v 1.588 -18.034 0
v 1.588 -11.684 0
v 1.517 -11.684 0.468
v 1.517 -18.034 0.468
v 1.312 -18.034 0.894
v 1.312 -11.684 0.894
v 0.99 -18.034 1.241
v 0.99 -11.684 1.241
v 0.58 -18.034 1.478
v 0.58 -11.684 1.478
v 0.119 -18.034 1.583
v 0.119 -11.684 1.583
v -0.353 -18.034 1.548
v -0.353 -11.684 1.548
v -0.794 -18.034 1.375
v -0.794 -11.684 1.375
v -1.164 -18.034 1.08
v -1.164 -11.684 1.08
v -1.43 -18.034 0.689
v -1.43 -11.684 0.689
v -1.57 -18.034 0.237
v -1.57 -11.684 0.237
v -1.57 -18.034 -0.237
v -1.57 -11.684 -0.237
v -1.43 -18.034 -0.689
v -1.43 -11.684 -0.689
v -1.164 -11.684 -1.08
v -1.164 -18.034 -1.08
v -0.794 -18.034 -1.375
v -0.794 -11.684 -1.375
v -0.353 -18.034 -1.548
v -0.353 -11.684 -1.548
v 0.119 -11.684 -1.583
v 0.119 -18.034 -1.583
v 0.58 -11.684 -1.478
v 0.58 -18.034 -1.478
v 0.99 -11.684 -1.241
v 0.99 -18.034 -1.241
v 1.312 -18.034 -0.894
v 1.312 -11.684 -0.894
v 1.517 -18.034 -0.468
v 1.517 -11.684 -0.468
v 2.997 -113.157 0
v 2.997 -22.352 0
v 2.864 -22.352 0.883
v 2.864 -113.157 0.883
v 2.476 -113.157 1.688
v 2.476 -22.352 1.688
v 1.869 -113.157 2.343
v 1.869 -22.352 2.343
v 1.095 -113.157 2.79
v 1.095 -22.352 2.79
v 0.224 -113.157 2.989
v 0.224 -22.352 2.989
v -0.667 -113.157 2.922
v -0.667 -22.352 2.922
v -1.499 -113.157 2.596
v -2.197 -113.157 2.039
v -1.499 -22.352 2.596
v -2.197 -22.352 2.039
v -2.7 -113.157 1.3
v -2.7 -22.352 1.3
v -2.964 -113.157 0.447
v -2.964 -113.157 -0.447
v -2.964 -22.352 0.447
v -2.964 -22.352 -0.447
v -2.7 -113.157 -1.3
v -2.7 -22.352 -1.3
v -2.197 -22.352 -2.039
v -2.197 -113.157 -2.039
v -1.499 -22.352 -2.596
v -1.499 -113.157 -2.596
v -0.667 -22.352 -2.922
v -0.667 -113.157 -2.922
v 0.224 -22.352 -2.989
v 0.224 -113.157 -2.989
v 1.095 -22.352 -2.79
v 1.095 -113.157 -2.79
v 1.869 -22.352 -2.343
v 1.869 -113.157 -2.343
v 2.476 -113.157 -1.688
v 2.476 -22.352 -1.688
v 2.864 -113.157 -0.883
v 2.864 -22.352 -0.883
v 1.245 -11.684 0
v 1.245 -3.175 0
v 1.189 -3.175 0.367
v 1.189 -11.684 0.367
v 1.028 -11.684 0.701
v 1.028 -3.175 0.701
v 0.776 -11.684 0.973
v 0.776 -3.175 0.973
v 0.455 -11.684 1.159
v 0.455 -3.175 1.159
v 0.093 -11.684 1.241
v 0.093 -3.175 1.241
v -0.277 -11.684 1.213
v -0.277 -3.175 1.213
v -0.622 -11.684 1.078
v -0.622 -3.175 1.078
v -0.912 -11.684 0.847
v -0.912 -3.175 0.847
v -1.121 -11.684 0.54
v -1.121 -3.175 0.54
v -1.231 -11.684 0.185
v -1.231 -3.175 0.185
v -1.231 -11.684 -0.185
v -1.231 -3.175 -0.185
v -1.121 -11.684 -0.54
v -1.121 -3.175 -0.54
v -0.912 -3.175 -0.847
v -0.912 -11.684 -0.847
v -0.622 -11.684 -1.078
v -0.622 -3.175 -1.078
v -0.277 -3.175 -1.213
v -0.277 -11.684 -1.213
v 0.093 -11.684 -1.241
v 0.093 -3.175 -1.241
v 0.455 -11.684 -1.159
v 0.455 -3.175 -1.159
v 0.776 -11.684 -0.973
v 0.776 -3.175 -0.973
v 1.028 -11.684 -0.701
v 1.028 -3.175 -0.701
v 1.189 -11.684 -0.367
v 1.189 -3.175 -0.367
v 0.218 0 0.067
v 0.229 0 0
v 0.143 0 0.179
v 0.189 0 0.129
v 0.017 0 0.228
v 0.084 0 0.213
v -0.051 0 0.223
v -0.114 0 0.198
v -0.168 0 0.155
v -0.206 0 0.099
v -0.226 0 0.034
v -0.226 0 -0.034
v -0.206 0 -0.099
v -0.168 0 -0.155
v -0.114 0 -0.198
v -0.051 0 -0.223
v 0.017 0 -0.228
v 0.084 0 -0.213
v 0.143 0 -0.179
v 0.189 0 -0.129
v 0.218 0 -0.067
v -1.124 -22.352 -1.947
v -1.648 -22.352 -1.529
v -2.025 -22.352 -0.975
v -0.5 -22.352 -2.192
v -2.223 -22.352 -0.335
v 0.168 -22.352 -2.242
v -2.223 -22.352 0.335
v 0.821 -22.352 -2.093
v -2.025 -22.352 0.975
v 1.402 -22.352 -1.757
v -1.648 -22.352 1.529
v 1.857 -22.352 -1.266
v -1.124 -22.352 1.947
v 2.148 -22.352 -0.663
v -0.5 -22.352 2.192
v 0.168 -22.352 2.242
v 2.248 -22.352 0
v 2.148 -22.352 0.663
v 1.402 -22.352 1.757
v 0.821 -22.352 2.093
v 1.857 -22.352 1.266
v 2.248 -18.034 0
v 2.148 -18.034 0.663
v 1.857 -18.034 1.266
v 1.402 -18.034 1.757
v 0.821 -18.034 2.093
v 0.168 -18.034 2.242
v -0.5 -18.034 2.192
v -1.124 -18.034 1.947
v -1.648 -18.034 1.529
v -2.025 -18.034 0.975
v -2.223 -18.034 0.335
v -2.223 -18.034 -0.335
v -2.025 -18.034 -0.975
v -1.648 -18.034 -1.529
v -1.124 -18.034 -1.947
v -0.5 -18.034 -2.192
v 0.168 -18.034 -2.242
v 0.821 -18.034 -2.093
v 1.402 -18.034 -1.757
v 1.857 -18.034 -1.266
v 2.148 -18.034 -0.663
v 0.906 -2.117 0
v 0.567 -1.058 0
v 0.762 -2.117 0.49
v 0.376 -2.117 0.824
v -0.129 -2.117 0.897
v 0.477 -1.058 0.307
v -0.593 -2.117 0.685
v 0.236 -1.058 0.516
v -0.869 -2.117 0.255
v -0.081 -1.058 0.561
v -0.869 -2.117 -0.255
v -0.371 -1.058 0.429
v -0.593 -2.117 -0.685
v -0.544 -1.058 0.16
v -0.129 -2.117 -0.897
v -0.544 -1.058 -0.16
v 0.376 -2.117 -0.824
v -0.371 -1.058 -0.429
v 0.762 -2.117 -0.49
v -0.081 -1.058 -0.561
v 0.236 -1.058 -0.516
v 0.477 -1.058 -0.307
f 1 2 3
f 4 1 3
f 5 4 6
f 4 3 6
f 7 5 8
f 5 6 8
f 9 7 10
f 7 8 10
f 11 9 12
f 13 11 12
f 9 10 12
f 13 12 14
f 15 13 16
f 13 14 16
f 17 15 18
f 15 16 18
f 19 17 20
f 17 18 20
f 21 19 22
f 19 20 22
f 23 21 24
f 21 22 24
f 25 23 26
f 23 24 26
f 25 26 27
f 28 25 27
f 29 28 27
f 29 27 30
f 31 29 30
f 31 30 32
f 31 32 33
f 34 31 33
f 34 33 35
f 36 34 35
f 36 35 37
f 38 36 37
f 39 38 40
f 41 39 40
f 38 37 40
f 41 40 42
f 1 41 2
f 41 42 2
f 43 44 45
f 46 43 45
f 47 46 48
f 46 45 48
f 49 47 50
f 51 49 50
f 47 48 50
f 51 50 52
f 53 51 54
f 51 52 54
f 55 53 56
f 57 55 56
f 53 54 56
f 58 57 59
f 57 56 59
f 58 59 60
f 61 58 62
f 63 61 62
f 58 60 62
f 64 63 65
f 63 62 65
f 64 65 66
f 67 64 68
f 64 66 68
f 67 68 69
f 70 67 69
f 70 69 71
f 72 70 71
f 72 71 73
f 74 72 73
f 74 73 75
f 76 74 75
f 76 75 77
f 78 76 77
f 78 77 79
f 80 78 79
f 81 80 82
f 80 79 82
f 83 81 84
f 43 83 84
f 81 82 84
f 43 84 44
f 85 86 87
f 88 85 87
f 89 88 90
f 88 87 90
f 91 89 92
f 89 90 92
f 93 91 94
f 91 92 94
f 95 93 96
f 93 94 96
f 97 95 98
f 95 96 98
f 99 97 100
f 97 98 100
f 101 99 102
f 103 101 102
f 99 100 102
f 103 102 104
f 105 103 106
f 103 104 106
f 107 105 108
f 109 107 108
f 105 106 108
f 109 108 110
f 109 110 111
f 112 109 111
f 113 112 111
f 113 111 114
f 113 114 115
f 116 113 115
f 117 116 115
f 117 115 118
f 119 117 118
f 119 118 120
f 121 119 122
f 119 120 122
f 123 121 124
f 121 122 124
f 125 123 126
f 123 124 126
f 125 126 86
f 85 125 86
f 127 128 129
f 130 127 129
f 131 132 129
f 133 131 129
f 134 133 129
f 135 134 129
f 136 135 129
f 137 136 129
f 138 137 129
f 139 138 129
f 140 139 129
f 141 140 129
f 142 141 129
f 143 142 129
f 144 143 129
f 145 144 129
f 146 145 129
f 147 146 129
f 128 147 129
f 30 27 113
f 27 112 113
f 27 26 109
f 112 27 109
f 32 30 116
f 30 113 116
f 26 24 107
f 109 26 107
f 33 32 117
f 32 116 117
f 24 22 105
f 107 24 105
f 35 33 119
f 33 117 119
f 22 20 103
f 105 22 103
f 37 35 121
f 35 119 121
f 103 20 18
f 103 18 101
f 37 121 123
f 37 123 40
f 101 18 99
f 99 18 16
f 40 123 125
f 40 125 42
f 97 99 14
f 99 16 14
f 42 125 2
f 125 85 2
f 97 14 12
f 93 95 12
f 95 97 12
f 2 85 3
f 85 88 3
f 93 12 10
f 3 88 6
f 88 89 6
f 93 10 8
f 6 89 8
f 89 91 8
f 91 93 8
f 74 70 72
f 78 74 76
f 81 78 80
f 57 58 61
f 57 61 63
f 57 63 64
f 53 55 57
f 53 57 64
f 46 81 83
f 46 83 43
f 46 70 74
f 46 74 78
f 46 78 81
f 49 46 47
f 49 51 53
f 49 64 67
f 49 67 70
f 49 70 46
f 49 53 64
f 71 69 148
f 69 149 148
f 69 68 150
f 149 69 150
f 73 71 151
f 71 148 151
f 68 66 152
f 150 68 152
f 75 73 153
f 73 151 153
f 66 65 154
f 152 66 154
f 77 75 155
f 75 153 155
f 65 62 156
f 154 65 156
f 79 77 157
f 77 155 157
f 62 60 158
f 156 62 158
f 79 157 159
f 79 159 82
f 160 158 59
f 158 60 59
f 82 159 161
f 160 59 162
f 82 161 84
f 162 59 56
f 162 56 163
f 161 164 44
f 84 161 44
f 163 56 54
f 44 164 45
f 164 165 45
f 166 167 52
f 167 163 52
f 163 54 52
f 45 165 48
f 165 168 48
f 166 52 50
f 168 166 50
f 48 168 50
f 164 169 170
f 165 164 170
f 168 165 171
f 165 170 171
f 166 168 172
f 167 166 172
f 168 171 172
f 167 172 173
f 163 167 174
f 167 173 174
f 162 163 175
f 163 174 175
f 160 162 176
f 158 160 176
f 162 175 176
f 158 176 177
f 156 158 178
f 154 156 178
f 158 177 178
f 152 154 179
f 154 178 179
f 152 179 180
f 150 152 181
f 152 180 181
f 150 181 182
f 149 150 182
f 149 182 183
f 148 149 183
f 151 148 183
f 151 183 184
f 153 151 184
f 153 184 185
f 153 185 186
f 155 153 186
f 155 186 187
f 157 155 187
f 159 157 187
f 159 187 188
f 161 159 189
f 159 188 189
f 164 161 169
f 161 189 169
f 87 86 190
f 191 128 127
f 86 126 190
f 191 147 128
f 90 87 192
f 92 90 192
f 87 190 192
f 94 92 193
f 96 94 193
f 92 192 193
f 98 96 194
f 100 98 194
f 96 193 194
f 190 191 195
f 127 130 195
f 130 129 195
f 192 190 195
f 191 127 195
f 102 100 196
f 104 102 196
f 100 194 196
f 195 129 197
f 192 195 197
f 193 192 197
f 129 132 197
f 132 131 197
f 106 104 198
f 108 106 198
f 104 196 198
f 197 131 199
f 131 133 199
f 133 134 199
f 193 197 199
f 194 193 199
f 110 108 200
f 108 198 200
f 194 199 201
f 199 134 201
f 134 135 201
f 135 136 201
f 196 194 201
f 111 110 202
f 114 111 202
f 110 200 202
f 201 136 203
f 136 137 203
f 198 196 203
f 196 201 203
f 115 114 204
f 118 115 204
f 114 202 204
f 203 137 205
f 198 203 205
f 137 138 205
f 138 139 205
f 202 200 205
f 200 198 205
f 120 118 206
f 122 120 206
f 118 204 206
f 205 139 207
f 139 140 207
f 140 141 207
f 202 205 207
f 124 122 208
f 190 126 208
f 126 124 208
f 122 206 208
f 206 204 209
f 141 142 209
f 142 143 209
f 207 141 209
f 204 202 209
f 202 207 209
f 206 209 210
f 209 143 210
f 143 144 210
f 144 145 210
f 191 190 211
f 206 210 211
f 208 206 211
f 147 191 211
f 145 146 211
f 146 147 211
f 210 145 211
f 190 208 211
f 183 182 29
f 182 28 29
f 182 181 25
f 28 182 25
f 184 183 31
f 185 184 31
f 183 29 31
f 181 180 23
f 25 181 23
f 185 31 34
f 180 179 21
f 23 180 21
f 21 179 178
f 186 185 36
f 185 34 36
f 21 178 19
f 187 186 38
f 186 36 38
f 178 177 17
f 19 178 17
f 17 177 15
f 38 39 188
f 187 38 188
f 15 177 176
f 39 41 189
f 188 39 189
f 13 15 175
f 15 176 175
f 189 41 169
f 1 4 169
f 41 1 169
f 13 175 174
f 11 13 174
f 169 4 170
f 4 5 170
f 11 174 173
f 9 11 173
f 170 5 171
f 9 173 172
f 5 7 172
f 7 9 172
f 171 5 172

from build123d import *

# Parameters (mm, degrees)
F0_R     = 1.2446
F1_DEPTH = 11.684
F2_SIZE2 = 1.016
F2_SIZE  = 3.175
F3_R     = 1.5875
F4_DEPTH = 6.35
F5_R     = 2.2479
F6_DEPTH = 4.318
F7_R     = 2.9972
F8_DEPTH = 90.805


with BuildPart() as f1:
    # F0 (on Front) → F1 (new body)
    with BuildSketch(Plane.XZ):
        Circle(F0_R)
    extrude(amount=F1_DEPTH)

    # F2
    f2_edges = [f1.edges().sort_by_distance(p)[0] for p in [
        (-1.2446, 0, 0),
    ]]
    f2_side = f1.faces().sort_by_distance((-1.2446, -5.842, 0))[0]
    chamfer(f2_edges, length=F2_SIZE, length2=F2_SIZE2, reference=f2_side)

    # F3 (on face) → F4 (join)
    with BuildSketch(Plane.XZ.offset(11.684)):
        Circle(F3_R)
    extrude(amount=F4_DEPTH)

    # F5 (on face) → F6 (join)
    with BuildSketch(Plane.XZ.offset(18.034)):
        Circle(F5_R)
    extrude(amount=F6_DEPTH)

    # F7 (on face) → F8 (join)
    with BuildSketch(Plane.XZ.offset(22.352)):
        Circle(F7_R)
    extrude(amount=F8_DEPTH)


solid = f1.part
